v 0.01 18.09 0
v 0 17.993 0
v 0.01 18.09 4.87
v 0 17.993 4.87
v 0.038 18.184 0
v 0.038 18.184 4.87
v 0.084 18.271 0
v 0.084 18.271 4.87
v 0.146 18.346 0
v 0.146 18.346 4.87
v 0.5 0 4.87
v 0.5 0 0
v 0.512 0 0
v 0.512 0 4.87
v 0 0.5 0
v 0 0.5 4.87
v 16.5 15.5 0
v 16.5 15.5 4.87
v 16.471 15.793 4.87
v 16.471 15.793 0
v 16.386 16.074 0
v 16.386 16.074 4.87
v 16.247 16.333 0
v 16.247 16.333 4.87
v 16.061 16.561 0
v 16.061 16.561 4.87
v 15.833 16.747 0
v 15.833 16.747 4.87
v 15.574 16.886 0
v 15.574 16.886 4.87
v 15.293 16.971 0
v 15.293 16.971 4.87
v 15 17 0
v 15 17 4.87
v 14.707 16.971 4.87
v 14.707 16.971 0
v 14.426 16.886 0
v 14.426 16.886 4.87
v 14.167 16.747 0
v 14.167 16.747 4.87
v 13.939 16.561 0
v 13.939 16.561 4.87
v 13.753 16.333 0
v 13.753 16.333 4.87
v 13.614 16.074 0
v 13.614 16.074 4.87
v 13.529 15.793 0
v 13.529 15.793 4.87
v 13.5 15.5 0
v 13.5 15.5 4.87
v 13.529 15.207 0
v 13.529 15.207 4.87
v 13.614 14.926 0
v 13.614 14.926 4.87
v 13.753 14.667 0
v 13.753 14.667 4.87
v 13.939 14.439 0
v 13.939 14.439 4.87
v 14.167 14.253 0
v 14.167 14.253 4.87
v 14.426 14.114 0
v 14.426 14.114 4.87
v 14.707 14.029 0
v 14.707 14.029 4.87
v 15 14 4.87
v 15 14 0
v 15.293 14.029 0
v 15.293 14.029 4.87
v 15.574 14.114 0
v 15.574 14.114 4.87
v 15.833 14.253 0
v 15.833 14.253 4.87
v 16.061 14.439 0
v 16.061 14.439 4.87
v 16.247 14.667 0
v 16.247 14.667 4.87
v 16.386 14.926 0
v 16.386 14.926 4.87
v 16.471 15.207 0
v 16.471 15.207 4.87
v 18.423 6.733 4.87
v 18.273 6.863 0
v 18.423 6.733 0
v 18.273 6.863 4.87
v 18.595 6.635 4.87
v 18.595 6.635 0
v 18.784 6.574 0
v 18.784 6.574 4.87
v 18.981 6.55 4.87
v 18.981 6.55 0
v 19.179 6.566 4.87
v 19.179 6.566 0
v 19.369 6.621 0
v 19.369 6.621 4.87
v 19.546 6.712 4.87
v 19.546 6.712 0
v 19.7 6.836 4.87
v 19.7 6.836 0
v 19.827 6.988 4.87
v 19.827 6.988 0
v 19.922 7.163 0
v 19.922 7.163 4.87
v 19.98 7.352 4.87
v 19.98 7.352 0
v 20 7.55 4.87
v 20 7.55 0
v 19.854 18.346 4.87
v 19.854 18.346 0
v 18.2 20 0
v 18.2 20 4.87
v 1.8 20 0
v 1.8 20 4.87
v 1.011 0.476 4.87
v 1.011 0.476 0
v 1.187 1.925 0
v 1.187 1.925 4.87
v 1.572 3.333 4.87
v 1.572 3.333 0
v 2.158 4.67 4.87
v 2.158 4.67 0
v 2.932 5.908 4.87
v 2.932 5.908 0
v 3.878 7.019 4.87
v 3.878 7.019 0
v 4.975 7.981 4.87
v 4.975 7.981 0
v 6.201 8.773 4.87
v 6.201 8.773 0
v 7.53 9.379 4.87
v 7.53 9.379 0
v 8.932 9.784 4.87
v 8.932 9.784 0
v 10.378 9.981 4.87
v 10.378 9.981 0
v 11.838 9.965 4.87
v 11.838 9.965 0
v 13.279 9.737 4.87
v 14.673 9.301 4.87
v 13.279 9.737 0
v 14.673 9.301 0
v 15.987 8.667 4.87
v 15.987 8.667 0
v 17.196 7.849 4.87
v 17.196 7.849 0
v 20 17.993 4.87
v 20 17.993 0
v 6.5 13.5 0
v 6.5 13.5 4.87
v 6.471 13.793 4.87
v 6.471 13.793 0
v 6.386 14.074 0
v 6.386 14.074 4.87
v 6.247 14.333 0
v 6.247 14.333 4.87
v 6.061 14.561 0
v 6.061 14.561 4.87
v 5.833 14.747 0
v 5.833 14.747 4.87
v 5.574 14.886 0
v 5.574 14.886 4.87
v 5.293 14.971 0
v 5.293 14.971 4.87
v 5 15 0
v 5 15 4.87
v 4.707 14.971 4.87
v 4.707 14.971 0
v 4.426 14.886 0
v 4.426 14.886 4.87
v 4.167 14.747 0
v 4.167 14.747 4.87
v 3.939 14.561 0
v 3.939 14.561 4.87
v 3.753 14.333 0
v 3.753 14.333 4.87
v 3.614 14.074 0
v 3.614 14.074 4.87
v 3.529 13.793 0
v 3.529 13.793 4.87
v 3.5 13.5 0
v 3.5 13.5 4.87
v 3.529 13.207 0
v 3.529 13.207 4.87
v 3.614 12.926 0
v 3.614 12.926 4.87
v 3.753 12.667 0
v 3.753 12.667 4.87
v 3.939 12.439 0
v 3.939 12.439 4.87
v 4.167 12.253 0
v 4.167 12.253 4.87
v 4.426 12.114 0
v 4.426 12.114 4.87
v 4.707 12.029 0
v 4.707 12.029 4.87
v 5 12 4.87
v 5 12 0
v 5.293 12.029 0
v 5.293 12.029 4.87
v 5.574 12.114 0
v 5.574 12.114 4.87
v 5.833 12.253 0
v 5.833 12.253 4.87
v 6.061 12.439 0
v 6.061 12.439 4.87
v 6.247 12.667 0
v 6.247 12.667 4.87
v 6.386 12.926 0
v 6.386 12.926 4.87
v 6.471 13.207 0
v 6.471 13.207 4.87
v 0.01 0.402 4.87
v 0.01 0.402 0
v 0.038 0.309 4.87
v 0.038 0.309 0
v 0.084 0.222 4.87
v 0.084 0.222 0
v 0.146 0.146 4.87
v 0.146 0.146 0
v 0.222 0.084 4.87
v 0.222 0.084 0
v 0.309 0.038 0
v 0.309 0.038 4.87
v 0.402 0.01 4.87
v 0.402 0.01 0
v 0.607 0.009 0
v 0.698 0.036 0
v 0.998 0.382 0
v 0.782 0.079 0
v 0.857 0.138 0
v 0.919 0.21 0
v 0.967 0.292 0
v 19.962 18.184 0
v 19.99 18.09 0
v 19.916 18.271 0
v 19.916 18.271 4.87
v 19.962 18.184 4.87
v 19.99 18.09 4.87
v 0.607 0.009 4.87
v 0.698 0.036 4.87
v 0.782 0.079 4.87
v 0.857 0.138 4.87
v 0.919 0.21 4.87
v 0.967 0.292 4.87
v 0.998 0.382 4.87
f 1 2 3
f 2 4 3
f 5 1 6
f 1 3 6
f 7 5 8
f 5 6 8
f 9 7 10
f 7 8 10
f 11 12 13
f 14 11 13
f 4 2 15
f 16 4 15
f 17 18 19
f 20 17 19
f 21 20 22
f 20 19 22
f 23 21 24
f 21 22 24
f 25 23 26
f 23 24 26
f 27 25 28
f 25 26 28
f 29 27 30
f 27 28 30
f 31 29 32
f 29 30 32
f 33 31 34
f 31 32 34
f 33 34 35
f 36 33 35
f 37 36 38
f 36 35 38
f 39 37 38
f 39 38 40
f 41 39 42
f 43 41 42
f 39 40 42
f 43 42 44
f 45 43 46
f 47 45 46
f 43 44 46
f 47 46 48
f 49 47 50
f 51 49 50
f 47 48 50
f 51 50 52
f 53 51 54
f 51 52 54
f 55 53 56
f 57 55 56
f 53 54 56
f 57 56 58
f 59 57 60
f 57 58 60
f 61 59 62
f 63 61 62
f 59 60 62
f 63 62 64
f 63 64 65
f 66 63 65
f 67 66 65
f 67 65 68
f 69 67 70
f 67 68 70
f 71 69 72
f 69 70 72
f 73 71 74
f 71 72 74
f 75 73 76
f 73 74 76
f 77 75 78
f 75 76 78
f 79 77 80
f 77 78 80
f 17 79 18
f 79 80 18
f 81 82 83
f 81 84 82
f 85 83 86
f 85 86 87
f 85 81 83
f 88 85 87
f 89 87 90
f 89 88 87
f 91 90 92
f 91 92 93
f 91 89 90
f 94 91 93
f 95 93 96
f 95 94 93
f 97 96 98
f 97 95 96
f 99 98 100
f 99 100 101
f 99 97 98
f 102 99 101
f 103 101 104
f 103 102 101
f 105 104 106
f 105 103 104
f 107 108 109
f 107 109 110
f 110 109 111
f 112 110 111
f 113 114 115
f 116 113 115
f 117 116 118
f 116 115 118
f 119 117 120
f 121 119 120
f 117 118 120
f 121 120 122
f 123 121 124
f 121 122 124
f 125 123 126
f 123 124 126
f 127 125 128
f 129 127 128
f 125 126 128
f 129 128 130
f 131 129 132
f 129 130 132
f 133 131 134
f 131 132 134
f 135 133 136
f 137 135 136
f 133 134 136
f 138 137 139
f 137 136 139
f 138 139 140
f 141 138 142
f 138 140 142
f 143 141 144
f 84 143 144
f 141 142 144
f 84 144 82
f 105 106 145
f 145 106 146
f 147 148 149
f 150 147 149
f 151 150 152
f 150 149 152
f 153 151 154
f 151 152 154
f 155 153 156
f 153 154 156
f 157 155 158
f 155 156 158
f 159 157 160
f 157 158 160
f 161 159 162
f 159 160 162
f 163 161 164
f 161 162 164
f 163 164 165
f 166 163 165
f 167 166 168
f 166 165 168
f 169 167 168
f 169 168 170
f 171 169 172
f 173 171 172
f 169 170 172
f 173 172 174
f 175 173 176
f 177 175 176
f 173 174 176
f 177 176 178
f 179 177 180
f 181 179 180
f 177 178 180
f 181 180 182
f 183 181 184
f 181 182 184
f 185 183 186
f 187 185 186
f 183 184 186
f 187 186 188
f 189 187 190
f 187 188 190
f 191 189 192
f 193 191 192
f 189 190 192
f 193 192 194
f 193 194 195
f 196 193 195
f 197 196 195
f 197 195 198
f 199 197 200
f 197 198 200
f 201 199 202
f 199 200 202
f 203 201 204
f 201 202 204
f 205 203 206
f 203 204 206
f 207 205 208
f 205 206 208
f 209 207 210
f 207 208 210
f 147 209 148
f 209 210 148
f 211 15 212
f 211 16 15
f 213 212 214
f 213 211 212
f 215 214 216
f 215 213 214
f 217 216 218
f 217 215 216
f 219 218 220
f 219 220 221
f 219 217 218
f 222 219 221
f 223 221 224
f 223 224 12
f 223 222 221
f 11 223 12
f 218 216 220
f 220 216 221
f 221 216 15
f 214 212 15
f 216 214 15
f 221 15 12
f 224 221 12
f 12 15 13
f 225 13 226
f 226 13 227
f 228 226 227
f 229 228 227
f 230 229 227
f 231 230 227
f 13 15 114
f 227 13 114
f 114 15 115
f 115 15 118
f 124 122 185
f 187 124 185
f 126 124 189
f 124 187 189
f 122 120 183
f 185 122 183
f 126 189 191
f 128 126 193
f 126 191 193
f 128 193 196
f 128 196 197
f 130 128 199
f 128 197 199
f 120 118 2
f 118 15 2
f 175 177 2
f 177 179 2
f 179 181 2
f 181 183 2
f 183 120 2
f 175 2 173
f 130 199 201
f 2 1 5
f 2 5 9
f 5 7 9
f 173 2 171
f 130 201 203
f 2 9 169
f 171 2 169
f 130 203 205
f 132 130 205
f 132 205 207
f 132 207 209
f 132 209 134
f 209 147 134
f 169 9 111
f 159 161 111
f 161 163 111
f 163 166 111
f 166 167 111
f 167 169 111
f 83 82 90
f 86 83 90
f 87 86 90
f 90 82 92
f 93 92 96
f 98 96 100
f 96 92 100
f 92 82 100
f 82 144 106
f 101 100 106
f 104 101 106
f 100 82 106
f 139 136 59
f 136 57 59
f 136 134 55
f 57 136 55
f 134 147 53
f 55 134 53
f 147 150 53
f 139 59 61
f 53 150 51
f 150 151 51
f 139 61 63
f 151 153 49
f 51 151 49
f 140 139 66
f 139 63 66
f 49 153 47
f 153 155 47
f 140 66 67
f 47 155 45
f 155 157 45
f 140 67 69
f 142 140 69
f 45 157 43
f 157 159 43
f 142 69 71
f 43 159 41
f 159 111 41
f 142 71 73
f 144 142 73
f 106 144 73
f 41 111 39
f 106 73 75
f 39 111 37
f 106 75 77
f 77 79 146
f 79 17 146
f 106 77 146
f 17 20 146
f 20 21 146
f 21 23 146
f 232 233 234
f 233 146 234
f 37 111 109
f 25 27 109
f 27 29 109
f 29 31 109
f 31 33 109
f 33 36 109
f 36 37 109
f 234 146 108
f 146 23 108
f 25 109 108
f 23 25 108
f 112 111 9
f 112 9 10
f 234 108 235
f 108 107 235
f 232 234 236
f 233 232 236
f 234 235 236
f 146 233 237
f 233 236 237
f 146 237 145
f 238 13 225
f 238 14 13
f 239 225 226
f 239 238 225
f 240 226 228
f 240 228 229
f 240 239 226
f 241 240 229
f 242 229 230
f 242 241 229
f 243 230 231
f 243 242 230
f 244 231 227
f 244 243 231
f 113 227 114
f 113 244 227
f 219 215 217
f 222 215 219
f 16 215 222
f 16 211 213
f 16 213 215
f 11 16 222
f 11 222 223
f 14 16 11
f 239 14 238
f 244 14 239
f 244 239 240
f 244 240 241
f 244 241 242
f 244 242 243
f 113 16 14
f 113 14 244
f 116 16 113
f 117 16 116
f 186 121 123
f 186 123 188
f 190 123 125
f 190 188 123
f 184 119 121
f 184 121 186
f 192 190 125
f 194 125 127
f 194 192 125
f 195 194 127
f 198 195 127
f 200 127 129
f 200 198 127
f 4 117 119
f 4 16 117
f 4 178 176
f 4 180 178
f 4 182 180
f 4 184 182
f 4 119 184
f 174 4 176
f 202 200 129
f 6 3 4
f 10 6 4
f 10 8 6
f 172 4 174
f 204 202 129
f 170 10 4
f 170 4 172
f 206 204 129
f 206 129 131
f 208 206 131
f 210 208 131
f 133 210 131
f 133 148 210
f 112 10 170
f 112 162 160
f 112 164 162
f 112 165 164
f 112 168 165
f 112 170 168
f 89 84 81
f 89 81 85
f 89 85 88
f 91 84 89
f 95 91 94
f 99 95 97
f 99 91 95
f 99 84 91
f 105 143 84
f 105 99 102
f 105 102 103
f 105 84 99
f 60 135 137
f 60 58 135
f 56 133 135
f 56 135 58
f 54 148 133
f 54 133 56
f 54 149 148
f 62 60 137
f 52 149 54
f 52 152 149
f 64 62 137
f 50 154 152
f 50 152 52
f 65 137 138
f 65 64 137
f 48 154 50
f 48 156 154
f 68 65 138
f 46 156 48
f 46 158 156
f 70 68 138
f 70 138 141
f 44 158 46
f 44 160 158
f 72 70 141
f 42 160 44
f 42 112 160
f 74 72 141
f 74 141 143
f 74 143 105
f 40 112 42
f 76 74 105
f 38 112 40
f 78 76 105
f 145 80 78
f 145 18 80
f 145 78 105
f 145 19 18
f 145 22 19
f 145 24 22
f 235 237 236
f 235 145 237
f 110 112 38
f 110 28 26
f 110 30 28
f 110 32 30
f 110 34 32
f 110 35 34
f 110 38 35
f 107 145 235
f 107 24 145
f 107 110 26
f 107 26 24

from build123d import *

# Parameters (mm, degrees)
BOSS_EXTRUDE1_DEPTH = 4.87
SKETCH2_R           = 1.5
CUT_EXTRUDE1_DEPTH  = 4.87
CHAMFER1_SIZE       = 1.8
FILLET1_R           = 0.5
FILLET2_R           = 1


with BuildPart() as part:
    # Sketch1 → Boss-Extrude1 (new body)
    with BuildSketch(Plane.XY):
        with BuildLine():
            Line((0, 0), (1, 0))
            ThreePointArc((1, 0), (8.763932023, 9.746794345), (20, 4.358898944))
            Line((20, 4.358898944), (20, 20))
            Line((20, 20), (0, 20))
            Line((0, 20), (0, 0))
        make_face()
    extrude(amount=BOSS_EXTRUDE1_DEPTH)

    # Sketch2 → Cut-Extrude1 (cut)
    with BuildSketch(Plane.XY.offset(4.87)):
        with Locations((5, 13.5)):
            Circle(SKETCH2_R)
        with Locations((15, 15.5)):
            Circle(SKETCH2_R)
    extrude(amount=-CUT_EXTRUDE1_DEPTH, mode=Mode.SUBTRACT)

    # Chamfer1
    chamfer1_edges = [part.edges().sort_by_distance(p)[0] for p in [
        (0, 20, 2.435),
        (20, 20, 2.435),
    ]]
    chamfer(chamfer1_edges, length=CHAMFER1_SIZE)

    # Fillet1
    fillet1_edges = [part.edges().sort_by_distance(p)[0] for p in [
        (0, 18.2, 2.435),
        (20, 18.2, 2.435),
        (1, 0, 2.435),
        (0, 0, 2.435),
    ]]
    fillet(fillet1_edges, radius=FILLET1_R)

    # Fillet2
    fillet2_edges = [part.edges().sort_by_distance(p)[0] for p in [
        (20, 4.358898944, 2.435),
    ]]
    fillet(fillet2_edges, radius=FILLET2_R)


solid = part.part
